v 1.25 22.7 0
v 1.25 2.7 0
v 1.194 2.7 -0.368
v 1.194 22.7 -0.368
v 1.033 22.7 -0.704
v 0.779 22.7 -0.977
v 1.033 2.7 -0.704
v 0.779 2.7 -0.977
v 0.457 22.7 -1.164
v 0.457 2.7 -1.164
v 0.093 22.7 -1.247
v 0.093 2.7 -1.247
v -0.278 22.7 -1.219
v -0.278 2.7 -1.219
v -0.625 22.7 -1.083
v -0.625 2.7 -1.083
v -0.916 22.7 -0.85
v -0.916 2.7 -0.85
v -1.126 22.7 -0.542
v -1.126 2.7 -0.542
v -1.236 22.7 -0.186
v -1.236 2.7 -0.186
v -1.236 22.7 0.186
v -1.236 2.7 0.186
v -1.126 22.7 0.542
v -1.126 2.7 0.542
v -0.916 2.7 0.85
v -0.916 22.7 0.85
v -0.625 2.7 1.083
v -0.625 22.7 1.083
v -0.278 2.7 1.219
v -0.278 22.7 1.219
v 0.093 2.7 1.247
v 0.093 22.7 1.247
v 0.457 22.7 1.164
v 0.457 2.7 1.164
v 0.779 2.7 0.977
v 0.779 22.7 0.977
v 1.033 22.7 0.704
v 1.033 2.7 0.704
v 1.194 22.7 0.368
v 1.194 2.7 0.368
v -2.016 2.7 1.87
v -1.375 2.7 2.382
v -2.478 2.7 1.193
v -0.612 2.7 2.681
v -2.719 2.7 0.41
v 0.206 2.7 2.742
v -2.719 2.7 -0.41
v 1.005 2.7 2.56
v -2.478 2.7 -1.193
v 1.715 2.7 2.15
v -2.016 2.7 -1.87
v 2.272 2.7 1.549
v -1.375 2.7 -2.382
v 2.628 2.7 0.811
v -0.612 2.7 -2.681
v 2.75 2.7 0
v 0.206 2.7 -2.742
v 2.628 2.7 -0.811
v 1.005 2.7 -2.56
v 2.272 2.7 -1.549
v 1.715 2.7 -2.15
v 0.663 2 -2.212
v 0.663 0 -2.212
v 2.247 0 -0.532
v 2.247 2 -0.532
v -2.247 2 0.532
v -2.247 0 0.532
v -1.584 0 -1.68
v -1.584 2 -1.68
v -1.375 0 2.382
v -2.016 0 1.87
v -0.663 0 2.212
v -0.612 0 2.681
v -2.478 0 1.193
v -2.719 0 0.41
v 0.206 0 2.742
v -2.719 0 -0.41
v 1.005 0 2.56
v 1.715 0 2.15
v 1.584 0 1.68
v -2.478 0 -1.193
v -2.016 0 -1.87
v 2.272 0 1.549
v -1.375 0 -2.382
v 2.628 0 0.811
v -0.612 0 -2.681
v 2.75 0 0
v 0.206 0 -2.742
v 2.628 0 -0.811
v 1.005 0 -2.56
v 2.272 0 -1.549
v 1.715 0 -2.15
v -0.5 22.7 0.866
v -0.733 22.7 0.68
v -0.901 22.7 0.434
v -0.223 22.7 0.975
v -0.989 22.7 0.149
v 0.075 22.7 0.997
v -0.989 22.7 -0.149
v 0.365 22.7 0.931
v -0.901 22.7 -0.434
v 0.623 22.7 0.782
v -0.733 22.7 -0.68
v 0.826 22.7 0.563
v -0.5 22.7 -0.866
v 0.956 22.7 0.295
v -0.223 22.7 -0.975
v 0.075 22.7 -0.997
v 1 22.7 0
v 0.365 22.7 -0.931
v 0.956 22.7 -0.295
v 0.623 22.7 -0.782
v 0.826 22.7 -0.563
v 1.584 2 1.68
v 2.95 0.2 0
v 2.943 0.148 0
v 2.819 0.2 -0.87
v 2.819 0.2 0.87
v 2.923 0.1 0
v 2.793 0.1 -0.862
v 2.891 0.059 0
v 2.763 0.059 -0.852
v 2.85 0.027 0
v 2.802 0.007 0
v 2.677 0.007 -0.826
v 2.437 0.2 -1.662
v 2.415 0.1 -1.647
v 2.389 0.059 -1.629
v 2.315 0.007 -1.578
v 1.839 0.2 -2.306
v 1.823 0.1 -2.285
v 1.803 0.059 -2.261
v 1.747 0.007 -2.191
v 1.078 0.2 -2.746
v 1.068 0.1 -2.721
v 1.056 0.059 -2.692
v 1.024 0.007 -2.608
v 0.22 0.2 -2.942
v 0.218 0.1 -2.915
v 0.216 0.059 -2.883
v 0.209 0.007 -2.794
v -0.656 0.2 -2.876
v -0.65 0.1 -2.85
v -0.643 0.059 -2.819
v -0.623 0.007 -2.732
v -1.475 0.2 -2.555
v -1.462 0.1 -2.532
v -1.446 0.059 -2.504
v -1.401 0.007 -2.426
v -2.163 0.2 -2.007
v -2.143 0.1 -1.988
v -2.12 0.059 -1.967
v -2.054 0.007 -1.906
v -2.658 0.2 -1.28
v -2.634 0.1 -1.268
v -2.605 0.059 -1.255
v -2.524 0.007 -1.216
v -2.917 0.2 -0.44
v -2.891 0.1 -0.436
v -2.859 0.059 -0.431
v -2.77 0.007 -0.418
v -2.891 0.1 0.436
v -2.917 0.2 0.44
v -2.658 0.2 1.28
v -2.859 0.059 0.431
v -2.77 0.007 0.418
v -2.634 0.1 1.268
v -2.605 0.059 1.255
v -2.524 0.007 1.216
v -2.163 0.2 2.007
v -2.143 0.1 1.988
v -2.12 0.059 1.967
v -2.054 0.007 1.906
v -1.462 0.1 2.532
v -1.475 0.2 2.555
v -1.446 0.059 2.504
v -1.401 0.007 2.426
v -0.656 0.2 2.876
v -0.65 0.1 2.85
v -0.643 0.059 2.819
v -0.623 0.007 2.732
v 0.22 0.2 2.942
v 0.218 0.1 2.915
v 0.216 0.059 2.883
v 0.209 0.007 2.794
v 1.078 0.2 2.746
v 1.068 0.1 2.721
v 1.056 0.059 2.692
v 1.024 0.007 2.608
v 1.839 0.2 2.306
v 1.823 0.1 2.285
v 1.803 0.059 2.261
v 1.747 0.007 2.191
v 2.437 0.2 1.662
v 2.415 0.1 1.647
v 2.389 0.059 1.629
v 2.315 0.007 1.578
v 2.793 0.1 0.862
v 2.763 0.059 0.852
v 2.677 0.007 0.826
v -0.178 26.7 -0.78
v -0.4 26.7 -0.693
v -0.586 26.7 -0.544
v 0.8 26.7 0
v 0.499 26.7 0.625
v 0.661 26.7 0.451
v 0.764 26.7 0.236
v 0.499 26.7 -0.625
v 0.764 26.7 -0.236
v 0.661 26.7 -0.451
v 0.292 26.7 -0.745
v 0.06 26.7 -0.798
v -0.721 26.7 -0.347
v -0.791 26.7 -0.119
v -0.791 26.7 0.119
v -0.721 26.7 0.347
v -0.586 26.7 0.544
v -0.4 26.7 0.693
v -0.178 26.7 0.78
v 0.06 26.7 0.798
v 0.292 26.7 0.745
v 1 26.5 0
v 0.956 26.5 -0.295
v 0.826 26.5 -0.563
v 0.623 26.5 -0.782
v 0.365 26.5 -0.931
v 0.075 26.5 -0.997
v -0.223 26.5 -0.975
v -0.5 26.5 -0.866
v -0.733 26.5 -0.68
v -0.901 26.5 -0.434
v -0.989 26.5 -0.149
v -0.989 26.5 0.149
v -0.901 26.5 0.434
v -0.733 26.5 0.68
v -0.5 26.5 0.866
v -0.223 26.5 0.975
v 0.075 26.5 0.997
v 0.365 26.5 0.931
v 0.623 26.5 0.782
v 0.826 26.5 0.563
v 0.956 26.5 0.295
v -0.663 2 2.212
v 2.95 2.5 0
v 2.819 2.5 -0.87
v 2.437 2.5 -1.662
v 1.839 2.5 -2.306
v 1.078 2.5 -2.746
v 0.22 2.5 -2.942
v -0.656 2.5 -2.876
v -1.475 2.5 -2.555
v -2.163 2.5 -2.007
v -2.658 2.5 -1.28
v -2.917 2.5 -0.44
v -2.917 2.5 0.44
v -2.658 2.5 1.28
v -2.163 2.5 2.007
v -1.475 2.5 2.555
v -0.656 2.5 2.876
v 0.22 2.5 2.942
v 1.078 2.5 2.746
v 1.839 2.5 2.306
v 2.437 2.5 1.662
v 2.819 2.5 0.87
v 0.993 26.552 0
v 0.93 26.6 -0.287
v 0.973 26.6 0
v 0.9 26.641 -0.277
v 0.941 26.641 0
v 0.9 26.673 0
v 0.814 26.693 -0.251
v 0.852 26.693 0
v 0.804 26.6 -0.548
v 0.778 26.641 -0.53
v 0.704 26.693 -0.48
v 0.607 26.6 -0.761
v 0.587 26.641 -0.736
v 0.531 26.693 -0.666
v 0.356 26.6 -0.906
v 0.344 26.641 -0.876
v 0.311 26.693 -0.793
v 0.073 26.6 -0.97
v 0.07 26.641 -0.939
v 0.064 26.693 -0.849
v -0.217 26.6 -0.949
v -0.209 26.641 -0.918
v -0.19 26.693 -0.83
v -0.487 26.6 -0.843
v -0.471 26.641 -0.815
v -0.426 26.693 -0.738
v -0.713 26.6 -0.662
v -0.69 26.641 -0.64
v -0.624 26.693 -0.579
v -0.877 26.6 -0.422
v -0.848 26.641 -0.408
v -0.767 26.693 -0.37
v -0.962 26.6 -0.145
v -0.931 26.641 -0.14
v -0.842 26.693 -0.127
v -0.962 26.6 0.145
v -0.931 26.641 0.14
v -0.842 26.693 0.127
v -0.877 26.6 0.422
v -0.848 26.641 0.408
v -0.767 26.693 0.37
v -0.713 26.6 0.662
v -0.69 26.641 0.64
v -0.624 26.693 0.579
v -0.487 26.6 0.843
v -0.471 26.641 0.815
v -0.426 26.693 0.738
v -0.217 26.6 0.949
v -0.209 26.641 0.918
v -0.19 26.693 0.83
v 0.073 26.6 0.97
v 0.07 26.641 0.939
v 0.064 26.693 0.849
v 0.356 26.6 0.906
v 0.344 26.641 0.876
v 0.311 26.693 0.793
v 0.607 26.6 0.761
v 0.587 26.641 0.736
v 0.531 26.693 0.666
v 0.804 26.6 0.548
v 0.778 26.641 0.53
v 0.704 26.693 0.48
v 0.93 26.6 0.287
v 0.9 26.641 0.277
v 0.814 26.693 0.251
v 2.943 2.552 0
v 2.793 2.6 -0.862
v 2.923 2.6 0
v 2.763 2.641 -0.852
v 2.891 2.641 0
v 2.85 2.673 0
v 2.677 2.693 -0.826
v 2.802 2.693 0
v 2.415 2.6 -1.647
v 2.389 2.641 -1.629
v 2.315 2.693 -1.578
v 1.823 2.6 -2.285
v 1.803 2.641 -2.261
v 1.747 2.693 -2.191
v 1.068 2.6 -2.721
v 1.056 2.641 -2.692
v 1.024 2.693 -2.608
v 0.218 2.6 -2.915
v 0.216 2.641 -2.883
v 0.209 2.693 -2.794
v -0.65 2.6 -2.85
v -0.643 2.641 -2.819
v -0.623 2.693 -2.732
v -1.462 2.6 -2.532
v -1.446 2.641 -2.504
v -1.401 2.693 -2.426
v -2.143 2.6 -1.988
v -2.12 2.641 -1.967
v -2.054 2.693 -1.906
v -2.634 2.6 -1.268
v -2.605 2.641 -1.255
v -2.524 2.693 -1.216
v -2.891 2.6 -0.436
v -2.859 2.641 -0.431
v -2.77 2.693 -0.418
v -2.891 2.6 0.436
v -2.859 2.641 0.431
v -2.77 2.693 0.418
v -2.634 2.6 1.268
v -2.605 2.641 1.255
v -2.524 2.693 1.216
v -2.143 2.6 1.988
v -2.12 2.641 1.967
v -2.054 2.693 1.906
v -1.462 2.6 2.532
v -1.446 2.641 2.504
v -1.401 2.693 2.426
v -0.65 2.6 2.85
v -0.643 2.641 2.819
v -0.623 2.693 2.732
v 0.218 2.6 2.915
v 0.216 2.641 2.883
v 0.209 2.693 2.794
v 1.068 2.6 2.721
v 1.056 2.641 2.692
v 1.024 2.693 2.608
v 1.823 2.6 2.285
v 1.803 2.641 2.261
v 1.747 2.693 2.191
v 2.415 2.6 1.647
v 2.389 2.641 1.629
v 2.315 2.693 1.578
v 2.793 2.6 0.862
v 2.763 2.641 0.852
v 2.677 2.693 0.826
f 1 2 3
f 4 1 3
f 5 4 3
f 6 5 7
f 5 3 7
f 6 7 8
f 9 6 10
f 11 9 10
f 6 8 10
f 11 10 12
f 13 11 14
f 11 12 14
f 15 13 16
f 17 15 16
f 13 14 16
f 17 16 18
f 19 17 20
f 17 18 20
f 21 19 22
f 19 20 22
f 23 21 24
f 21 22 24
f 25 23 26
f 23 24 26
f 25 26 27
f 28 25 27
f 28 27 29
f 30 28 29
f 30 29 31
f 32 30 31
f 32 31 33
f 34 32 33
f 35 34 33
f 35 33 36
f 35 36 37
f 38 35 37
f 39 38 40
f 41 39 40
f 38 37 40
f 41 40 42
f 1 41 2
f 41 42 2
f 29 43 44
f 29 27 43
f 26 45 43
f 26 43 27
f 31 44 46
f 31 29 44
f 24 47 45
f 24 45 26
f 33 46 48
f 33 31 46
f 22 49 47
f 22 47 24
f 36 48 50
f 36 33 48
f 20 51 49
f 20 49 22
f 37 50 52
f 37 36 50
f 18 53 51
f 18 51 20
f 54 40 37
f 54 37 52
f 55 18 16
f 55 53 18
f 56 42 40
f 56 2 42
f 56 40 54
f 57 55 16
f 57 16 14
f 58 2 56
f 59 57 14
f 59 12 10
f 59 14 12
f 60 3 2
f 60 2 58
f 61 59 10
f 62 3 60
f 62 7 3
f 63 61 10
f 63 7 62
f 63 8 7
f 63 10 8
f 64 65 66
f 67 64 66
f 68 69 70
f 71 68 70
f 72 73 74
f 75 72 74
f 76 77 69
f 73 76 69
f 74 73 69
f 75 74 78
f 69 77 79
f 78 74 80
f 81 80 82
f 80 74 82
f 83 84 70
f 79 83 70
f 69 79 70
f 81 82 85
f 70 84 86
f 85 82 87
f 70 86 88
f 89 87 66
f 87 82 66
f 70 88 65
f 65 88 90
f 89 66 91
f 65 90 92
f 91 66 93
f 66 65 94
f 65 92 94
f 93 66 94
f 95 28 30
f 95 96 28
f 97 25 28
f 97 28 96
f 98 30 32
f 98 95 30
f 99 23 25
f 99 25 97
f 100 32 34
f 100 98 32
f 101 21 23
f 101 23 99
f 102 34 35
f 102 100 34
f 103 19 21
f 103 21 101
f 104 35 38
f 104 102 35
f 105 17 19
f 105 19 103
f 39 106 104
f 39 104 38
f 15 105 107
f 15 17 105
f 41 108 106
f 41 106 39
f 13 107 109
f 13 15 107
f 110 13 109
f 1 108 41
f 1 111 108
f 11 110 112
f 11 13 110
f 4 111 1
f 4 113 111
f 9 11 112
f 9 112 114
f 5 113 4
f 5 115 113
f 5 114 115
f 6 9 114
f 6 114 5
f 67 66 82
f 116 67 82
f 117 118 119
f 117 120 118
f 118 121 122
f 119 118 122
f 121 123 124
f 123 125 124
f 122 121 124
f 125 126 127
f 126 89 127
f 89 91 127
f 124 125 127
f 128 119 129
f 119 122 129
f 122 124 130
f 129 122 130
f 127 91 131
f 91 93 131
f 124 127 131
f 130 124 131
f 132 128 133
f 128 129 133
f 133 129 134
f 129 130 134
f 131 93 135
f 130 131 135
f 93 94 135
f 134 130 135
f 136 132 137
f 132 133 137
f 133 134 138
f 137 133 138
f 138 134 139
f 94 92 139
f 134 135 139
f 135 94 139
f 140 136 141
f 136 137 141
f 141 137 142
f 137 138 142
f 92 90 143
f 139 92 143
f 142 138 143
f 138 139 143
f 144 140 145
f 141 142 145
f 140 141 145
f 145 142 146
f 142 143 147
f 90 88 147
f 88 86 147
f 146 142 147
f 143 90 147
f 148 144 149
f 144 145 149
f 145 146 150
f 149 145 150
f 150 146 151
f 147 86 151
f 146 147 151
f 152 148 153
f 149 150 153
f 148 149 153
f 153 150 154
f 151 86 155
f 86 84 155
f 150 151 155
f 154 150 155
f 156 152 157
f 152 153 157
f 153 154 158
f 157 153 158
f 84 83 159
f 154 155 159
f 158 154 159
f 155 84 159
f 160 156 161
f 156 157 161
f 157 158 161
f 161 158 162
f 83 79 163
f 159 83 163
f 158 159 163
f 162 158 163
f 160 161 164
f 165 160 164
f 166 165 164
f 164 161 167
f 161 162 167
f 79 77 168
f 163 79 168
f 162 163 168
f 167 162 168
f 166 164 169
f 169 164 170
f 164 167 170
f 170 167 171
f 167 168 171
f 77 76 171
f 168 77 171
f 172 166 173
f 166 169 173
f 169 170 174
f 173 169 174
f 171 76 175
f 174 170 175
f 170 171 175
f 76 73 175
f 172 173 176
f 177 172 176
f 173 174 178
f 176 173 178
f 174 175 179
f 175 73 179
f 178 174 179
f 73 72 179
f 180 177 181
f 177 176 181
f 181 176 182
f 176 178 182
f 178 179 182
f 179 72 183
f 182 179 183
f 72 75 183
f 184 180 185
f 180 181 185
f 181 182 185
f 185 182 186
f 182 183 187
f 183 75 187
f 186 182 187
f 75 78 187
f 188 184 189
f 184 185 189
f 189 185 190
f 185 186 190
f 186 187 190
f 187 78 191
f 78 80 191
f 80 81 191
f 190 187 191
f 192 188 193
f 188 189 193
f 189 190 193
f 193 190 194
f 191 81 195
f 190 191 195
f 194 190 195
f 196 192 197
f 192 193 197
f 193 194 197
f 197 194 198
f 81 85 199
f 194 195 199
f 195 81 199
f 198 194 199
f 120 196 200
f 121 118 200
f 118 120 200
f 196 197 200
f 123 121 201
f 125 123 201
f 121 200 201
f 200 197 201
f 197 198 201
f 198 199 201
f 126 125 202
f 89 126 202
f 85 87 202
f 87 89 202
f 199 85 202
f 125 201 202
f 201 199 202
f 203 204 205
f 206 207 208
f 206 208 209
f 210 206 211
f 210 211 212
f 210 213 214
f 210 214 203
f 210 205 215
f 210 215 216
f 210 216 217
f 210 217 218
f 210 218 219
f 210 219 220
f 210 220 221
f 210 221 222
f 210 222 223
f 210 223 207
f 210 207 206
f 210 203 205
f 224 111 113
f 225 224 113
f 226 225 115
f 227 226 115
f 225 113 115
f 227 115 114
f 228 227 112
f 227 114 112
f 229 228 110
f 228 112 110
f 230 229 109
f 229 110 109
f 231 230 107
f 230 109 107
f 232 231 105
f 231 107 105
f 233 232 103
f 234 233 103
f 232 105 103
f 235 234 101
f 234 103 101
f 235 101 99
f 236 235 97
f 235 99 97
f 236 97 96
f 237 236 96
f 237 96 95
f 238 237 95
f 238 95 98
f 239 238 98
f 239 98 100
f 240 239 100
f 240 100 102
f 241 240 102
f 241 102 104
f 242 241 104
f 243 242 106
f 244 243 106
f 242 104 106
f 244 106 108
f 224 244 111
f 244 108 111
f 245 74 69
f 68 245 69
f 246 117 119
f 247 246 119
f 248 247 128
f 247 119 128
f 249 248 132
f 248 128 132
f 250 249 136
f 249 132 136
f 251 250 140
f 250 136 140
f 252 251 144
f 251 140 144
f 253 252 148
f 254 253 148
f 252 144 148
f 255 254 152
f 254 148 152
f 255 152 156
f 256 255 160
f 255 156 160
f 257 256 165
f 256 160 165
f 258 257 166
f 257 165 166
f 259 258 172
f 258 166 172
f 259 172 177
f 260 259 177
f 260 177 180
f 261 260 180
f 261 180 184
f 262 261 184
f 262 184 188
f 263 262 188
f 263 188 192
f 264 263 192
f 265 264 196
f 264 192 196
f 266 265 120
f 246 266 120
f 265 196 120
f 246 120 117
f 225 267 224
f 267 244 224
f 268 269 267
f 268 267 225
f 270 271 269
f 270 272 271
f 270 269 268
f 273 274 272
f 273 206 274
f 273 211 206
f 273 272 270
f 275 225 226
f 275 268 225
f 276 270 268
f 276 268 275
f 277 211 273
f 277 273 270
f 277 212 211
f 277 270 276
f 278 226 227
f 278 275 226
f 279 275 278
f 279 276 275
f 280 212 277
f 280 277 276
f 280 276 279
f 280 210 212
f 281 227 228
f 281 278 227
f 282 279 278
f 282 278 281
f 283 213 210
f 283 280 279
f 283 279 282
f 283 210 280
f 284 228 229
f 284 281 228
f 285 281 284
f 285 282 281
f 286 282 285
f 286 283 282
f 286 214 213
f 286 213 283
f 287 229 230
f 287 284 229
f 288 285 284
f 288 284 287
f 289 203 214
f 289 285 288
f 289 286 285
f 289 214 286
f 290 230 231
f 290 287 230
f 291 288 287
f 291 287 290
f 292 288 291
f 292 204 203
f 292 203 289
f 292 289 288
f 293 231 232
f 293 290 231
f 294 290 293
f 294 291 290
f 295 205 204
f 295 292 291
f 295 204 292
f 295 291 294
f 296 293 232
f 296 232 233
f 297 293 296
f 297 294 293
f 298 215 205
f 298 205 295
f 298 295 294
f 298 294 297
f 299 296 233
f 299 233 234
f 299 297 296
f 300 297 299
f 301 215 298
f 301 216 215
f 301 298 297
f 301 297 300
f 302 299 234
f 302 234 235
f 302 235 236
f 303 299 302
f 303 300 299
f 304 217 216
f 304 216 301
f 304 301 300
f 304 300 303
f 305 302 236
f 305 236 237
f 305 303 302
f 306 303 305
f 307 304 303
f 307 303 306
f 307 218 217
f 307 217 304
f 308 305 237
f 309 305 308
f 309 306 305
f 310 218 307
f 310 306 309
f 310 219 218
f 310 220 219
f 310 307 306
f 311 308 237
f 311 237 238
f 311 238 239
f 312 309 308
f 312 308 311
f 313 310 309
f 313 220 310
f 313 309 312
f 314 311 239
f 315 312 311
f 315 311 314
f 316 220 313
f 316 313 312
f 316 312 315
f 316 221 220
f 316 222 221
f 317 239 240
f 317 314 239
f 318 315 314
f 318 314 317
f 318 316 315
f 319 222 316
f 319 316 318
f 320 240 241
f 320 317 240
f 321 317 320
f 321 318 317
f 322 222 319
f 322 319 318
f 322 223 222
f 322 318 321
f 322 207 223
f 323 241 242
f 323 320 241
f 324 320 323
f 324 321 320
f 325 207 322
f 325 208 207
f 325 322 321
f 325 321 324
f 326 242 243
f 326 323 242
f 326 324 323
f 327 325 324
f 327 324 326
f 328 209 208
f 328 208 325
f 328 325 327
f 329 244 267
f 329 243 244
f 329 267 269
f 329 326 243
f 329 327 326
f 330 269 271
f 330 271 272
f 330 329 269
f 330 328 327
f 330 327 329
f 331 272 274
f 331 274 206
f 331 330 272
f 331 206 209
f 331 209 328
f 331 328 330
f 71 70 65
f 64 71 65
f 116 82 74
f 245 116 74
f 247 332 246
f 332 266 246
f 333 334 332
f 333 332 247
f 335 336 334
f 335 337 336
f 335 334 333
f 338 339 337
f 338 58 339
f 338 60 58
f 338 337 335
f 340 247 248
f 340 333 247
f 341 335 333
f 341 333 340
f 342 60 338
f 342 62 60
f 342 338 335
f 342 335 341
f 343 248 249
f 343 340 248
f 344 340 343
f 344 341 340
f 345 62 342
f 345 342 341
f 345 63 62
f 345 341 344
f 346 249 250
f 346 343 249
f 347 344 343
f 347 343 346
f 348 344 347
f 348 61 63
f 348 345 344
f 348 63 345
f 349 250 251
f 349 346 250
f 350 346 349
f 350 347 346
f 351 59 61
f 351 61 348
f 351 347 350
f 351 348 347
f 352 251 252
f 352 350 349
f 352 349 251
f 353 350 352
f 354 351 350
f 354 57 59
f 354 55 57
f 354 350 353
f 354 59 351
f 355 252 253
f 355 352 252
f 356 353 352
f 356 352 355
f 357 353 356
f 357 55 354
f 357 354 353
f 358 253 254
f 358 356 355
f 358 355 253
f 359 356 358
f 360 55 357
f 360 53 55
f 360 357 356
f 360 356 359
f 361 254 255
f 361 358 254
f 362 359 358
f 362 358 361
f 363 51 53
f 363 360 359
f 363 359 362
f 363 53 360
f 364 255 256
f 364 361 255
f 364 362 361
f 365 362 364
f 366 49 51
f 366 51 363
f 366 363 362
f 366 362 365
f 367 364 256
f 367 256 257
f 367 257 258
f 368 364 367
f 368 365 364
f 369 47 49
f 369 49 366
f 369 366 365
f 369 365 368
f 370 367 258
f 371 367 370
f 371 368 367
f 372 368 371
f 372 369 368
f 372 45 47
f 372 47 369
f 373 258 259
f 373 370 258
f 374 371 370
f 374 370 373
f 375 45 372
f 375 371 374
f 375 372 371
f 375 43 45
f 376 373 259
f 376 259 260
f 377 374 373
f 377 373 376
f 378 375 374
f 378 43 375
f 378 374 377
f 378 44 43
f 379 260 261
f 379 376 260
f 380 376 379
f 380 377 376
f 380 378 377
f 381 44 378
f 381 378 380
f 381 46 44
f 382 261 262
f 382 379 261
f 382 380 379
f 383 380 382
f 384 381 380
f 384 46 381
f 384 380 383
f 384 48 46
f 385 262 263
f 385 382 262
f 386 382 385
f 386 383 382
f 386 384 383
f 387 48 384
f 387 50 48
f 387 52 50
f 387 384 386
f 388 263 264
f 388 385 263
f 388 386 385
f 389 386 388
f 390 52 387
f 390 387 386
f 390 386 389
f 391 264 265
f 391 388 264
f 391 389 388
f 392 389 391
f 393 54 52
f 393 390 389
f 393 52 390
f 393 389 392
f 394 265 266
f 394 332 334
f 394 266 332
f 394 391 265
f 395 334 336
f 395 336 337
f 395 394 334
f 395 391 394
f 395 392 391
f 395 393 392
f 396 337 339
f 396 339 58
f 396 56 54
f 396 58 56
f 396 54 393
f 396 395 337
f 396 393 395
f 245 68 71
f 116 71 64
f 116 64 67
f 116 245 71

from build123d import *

# Parameters (mm, degrees)
SKETCH_1_R          = 2.95
EXTRUDE_1_DEPTH     = 2.7
SKETCH_2_R          = 1.25
EXTRUDE_2_DEPTH     = 20
SKETCH_3_R          = 1
EXTRUDE_3_DEPTH     = 4
CUT_EXTRUDE_1_DEPTH = 2
FILLET_1_R          = 0.2


with BuildPart() as part:
    # 草图1 → 凸台-拉伸1 (new body)
    with BuildSketch(Plane(origin=(0, 0, 0), x_dir=(1, 0, 0), z_dir=(0, 1, 0))):
        Circle(SKETCH_1_R)
    extrude(amount=EXTRUDE_1_DEPTH)

    # 草图2 → 凸台-拉伸2 (add)
    with BuildSketch(Plane(origin=(0, 2.7, 0), x_dir=(1, 0, 0), z_dir=(0, 1, 0))):
        Circle(SKETCH_2_R)
    extrude(amount=EXTRUDE_2_DEPTH)

    # 草图3 → 凸台-拉伸3 (add)
    with BuildSketch(Plane(origin=(0, 22.7, 0), x_dir=(1, 0, 0), z_dir=(0, 1, 0))):
        Circle(SKETCH_3_R)
    extrude(amount=EXTRUDE_3_DEPTH)

    # 草图4 → 切除-拉伸1 (cut)
    with BuildSketch(Plane.XZ):
        Polygon((2.247285488, -0.53201623), (1.584382314, 1.680198207), (-0.662903174, 2.212214437), (-2.247285488, 0.53201623), (-1.584382314, -1.680198207), (0.662903174, -2.212214437), align=None)
    extrude(amount=-CUT_EXTRUDE_1_DEPTH, mode=Mode.SUBTRACT)

    # 圆角1
    fillet_1_edges = [part.edges().sort_by_distance(p)[0] for p in [
        (-1, 26.7, 0),
        (-2.95, 0, 0),
        (-2.95, 2.7, 0),
    ]]
    fillet(fillet_1_edges, radius=FILLET_1_R)


solid = part.part
